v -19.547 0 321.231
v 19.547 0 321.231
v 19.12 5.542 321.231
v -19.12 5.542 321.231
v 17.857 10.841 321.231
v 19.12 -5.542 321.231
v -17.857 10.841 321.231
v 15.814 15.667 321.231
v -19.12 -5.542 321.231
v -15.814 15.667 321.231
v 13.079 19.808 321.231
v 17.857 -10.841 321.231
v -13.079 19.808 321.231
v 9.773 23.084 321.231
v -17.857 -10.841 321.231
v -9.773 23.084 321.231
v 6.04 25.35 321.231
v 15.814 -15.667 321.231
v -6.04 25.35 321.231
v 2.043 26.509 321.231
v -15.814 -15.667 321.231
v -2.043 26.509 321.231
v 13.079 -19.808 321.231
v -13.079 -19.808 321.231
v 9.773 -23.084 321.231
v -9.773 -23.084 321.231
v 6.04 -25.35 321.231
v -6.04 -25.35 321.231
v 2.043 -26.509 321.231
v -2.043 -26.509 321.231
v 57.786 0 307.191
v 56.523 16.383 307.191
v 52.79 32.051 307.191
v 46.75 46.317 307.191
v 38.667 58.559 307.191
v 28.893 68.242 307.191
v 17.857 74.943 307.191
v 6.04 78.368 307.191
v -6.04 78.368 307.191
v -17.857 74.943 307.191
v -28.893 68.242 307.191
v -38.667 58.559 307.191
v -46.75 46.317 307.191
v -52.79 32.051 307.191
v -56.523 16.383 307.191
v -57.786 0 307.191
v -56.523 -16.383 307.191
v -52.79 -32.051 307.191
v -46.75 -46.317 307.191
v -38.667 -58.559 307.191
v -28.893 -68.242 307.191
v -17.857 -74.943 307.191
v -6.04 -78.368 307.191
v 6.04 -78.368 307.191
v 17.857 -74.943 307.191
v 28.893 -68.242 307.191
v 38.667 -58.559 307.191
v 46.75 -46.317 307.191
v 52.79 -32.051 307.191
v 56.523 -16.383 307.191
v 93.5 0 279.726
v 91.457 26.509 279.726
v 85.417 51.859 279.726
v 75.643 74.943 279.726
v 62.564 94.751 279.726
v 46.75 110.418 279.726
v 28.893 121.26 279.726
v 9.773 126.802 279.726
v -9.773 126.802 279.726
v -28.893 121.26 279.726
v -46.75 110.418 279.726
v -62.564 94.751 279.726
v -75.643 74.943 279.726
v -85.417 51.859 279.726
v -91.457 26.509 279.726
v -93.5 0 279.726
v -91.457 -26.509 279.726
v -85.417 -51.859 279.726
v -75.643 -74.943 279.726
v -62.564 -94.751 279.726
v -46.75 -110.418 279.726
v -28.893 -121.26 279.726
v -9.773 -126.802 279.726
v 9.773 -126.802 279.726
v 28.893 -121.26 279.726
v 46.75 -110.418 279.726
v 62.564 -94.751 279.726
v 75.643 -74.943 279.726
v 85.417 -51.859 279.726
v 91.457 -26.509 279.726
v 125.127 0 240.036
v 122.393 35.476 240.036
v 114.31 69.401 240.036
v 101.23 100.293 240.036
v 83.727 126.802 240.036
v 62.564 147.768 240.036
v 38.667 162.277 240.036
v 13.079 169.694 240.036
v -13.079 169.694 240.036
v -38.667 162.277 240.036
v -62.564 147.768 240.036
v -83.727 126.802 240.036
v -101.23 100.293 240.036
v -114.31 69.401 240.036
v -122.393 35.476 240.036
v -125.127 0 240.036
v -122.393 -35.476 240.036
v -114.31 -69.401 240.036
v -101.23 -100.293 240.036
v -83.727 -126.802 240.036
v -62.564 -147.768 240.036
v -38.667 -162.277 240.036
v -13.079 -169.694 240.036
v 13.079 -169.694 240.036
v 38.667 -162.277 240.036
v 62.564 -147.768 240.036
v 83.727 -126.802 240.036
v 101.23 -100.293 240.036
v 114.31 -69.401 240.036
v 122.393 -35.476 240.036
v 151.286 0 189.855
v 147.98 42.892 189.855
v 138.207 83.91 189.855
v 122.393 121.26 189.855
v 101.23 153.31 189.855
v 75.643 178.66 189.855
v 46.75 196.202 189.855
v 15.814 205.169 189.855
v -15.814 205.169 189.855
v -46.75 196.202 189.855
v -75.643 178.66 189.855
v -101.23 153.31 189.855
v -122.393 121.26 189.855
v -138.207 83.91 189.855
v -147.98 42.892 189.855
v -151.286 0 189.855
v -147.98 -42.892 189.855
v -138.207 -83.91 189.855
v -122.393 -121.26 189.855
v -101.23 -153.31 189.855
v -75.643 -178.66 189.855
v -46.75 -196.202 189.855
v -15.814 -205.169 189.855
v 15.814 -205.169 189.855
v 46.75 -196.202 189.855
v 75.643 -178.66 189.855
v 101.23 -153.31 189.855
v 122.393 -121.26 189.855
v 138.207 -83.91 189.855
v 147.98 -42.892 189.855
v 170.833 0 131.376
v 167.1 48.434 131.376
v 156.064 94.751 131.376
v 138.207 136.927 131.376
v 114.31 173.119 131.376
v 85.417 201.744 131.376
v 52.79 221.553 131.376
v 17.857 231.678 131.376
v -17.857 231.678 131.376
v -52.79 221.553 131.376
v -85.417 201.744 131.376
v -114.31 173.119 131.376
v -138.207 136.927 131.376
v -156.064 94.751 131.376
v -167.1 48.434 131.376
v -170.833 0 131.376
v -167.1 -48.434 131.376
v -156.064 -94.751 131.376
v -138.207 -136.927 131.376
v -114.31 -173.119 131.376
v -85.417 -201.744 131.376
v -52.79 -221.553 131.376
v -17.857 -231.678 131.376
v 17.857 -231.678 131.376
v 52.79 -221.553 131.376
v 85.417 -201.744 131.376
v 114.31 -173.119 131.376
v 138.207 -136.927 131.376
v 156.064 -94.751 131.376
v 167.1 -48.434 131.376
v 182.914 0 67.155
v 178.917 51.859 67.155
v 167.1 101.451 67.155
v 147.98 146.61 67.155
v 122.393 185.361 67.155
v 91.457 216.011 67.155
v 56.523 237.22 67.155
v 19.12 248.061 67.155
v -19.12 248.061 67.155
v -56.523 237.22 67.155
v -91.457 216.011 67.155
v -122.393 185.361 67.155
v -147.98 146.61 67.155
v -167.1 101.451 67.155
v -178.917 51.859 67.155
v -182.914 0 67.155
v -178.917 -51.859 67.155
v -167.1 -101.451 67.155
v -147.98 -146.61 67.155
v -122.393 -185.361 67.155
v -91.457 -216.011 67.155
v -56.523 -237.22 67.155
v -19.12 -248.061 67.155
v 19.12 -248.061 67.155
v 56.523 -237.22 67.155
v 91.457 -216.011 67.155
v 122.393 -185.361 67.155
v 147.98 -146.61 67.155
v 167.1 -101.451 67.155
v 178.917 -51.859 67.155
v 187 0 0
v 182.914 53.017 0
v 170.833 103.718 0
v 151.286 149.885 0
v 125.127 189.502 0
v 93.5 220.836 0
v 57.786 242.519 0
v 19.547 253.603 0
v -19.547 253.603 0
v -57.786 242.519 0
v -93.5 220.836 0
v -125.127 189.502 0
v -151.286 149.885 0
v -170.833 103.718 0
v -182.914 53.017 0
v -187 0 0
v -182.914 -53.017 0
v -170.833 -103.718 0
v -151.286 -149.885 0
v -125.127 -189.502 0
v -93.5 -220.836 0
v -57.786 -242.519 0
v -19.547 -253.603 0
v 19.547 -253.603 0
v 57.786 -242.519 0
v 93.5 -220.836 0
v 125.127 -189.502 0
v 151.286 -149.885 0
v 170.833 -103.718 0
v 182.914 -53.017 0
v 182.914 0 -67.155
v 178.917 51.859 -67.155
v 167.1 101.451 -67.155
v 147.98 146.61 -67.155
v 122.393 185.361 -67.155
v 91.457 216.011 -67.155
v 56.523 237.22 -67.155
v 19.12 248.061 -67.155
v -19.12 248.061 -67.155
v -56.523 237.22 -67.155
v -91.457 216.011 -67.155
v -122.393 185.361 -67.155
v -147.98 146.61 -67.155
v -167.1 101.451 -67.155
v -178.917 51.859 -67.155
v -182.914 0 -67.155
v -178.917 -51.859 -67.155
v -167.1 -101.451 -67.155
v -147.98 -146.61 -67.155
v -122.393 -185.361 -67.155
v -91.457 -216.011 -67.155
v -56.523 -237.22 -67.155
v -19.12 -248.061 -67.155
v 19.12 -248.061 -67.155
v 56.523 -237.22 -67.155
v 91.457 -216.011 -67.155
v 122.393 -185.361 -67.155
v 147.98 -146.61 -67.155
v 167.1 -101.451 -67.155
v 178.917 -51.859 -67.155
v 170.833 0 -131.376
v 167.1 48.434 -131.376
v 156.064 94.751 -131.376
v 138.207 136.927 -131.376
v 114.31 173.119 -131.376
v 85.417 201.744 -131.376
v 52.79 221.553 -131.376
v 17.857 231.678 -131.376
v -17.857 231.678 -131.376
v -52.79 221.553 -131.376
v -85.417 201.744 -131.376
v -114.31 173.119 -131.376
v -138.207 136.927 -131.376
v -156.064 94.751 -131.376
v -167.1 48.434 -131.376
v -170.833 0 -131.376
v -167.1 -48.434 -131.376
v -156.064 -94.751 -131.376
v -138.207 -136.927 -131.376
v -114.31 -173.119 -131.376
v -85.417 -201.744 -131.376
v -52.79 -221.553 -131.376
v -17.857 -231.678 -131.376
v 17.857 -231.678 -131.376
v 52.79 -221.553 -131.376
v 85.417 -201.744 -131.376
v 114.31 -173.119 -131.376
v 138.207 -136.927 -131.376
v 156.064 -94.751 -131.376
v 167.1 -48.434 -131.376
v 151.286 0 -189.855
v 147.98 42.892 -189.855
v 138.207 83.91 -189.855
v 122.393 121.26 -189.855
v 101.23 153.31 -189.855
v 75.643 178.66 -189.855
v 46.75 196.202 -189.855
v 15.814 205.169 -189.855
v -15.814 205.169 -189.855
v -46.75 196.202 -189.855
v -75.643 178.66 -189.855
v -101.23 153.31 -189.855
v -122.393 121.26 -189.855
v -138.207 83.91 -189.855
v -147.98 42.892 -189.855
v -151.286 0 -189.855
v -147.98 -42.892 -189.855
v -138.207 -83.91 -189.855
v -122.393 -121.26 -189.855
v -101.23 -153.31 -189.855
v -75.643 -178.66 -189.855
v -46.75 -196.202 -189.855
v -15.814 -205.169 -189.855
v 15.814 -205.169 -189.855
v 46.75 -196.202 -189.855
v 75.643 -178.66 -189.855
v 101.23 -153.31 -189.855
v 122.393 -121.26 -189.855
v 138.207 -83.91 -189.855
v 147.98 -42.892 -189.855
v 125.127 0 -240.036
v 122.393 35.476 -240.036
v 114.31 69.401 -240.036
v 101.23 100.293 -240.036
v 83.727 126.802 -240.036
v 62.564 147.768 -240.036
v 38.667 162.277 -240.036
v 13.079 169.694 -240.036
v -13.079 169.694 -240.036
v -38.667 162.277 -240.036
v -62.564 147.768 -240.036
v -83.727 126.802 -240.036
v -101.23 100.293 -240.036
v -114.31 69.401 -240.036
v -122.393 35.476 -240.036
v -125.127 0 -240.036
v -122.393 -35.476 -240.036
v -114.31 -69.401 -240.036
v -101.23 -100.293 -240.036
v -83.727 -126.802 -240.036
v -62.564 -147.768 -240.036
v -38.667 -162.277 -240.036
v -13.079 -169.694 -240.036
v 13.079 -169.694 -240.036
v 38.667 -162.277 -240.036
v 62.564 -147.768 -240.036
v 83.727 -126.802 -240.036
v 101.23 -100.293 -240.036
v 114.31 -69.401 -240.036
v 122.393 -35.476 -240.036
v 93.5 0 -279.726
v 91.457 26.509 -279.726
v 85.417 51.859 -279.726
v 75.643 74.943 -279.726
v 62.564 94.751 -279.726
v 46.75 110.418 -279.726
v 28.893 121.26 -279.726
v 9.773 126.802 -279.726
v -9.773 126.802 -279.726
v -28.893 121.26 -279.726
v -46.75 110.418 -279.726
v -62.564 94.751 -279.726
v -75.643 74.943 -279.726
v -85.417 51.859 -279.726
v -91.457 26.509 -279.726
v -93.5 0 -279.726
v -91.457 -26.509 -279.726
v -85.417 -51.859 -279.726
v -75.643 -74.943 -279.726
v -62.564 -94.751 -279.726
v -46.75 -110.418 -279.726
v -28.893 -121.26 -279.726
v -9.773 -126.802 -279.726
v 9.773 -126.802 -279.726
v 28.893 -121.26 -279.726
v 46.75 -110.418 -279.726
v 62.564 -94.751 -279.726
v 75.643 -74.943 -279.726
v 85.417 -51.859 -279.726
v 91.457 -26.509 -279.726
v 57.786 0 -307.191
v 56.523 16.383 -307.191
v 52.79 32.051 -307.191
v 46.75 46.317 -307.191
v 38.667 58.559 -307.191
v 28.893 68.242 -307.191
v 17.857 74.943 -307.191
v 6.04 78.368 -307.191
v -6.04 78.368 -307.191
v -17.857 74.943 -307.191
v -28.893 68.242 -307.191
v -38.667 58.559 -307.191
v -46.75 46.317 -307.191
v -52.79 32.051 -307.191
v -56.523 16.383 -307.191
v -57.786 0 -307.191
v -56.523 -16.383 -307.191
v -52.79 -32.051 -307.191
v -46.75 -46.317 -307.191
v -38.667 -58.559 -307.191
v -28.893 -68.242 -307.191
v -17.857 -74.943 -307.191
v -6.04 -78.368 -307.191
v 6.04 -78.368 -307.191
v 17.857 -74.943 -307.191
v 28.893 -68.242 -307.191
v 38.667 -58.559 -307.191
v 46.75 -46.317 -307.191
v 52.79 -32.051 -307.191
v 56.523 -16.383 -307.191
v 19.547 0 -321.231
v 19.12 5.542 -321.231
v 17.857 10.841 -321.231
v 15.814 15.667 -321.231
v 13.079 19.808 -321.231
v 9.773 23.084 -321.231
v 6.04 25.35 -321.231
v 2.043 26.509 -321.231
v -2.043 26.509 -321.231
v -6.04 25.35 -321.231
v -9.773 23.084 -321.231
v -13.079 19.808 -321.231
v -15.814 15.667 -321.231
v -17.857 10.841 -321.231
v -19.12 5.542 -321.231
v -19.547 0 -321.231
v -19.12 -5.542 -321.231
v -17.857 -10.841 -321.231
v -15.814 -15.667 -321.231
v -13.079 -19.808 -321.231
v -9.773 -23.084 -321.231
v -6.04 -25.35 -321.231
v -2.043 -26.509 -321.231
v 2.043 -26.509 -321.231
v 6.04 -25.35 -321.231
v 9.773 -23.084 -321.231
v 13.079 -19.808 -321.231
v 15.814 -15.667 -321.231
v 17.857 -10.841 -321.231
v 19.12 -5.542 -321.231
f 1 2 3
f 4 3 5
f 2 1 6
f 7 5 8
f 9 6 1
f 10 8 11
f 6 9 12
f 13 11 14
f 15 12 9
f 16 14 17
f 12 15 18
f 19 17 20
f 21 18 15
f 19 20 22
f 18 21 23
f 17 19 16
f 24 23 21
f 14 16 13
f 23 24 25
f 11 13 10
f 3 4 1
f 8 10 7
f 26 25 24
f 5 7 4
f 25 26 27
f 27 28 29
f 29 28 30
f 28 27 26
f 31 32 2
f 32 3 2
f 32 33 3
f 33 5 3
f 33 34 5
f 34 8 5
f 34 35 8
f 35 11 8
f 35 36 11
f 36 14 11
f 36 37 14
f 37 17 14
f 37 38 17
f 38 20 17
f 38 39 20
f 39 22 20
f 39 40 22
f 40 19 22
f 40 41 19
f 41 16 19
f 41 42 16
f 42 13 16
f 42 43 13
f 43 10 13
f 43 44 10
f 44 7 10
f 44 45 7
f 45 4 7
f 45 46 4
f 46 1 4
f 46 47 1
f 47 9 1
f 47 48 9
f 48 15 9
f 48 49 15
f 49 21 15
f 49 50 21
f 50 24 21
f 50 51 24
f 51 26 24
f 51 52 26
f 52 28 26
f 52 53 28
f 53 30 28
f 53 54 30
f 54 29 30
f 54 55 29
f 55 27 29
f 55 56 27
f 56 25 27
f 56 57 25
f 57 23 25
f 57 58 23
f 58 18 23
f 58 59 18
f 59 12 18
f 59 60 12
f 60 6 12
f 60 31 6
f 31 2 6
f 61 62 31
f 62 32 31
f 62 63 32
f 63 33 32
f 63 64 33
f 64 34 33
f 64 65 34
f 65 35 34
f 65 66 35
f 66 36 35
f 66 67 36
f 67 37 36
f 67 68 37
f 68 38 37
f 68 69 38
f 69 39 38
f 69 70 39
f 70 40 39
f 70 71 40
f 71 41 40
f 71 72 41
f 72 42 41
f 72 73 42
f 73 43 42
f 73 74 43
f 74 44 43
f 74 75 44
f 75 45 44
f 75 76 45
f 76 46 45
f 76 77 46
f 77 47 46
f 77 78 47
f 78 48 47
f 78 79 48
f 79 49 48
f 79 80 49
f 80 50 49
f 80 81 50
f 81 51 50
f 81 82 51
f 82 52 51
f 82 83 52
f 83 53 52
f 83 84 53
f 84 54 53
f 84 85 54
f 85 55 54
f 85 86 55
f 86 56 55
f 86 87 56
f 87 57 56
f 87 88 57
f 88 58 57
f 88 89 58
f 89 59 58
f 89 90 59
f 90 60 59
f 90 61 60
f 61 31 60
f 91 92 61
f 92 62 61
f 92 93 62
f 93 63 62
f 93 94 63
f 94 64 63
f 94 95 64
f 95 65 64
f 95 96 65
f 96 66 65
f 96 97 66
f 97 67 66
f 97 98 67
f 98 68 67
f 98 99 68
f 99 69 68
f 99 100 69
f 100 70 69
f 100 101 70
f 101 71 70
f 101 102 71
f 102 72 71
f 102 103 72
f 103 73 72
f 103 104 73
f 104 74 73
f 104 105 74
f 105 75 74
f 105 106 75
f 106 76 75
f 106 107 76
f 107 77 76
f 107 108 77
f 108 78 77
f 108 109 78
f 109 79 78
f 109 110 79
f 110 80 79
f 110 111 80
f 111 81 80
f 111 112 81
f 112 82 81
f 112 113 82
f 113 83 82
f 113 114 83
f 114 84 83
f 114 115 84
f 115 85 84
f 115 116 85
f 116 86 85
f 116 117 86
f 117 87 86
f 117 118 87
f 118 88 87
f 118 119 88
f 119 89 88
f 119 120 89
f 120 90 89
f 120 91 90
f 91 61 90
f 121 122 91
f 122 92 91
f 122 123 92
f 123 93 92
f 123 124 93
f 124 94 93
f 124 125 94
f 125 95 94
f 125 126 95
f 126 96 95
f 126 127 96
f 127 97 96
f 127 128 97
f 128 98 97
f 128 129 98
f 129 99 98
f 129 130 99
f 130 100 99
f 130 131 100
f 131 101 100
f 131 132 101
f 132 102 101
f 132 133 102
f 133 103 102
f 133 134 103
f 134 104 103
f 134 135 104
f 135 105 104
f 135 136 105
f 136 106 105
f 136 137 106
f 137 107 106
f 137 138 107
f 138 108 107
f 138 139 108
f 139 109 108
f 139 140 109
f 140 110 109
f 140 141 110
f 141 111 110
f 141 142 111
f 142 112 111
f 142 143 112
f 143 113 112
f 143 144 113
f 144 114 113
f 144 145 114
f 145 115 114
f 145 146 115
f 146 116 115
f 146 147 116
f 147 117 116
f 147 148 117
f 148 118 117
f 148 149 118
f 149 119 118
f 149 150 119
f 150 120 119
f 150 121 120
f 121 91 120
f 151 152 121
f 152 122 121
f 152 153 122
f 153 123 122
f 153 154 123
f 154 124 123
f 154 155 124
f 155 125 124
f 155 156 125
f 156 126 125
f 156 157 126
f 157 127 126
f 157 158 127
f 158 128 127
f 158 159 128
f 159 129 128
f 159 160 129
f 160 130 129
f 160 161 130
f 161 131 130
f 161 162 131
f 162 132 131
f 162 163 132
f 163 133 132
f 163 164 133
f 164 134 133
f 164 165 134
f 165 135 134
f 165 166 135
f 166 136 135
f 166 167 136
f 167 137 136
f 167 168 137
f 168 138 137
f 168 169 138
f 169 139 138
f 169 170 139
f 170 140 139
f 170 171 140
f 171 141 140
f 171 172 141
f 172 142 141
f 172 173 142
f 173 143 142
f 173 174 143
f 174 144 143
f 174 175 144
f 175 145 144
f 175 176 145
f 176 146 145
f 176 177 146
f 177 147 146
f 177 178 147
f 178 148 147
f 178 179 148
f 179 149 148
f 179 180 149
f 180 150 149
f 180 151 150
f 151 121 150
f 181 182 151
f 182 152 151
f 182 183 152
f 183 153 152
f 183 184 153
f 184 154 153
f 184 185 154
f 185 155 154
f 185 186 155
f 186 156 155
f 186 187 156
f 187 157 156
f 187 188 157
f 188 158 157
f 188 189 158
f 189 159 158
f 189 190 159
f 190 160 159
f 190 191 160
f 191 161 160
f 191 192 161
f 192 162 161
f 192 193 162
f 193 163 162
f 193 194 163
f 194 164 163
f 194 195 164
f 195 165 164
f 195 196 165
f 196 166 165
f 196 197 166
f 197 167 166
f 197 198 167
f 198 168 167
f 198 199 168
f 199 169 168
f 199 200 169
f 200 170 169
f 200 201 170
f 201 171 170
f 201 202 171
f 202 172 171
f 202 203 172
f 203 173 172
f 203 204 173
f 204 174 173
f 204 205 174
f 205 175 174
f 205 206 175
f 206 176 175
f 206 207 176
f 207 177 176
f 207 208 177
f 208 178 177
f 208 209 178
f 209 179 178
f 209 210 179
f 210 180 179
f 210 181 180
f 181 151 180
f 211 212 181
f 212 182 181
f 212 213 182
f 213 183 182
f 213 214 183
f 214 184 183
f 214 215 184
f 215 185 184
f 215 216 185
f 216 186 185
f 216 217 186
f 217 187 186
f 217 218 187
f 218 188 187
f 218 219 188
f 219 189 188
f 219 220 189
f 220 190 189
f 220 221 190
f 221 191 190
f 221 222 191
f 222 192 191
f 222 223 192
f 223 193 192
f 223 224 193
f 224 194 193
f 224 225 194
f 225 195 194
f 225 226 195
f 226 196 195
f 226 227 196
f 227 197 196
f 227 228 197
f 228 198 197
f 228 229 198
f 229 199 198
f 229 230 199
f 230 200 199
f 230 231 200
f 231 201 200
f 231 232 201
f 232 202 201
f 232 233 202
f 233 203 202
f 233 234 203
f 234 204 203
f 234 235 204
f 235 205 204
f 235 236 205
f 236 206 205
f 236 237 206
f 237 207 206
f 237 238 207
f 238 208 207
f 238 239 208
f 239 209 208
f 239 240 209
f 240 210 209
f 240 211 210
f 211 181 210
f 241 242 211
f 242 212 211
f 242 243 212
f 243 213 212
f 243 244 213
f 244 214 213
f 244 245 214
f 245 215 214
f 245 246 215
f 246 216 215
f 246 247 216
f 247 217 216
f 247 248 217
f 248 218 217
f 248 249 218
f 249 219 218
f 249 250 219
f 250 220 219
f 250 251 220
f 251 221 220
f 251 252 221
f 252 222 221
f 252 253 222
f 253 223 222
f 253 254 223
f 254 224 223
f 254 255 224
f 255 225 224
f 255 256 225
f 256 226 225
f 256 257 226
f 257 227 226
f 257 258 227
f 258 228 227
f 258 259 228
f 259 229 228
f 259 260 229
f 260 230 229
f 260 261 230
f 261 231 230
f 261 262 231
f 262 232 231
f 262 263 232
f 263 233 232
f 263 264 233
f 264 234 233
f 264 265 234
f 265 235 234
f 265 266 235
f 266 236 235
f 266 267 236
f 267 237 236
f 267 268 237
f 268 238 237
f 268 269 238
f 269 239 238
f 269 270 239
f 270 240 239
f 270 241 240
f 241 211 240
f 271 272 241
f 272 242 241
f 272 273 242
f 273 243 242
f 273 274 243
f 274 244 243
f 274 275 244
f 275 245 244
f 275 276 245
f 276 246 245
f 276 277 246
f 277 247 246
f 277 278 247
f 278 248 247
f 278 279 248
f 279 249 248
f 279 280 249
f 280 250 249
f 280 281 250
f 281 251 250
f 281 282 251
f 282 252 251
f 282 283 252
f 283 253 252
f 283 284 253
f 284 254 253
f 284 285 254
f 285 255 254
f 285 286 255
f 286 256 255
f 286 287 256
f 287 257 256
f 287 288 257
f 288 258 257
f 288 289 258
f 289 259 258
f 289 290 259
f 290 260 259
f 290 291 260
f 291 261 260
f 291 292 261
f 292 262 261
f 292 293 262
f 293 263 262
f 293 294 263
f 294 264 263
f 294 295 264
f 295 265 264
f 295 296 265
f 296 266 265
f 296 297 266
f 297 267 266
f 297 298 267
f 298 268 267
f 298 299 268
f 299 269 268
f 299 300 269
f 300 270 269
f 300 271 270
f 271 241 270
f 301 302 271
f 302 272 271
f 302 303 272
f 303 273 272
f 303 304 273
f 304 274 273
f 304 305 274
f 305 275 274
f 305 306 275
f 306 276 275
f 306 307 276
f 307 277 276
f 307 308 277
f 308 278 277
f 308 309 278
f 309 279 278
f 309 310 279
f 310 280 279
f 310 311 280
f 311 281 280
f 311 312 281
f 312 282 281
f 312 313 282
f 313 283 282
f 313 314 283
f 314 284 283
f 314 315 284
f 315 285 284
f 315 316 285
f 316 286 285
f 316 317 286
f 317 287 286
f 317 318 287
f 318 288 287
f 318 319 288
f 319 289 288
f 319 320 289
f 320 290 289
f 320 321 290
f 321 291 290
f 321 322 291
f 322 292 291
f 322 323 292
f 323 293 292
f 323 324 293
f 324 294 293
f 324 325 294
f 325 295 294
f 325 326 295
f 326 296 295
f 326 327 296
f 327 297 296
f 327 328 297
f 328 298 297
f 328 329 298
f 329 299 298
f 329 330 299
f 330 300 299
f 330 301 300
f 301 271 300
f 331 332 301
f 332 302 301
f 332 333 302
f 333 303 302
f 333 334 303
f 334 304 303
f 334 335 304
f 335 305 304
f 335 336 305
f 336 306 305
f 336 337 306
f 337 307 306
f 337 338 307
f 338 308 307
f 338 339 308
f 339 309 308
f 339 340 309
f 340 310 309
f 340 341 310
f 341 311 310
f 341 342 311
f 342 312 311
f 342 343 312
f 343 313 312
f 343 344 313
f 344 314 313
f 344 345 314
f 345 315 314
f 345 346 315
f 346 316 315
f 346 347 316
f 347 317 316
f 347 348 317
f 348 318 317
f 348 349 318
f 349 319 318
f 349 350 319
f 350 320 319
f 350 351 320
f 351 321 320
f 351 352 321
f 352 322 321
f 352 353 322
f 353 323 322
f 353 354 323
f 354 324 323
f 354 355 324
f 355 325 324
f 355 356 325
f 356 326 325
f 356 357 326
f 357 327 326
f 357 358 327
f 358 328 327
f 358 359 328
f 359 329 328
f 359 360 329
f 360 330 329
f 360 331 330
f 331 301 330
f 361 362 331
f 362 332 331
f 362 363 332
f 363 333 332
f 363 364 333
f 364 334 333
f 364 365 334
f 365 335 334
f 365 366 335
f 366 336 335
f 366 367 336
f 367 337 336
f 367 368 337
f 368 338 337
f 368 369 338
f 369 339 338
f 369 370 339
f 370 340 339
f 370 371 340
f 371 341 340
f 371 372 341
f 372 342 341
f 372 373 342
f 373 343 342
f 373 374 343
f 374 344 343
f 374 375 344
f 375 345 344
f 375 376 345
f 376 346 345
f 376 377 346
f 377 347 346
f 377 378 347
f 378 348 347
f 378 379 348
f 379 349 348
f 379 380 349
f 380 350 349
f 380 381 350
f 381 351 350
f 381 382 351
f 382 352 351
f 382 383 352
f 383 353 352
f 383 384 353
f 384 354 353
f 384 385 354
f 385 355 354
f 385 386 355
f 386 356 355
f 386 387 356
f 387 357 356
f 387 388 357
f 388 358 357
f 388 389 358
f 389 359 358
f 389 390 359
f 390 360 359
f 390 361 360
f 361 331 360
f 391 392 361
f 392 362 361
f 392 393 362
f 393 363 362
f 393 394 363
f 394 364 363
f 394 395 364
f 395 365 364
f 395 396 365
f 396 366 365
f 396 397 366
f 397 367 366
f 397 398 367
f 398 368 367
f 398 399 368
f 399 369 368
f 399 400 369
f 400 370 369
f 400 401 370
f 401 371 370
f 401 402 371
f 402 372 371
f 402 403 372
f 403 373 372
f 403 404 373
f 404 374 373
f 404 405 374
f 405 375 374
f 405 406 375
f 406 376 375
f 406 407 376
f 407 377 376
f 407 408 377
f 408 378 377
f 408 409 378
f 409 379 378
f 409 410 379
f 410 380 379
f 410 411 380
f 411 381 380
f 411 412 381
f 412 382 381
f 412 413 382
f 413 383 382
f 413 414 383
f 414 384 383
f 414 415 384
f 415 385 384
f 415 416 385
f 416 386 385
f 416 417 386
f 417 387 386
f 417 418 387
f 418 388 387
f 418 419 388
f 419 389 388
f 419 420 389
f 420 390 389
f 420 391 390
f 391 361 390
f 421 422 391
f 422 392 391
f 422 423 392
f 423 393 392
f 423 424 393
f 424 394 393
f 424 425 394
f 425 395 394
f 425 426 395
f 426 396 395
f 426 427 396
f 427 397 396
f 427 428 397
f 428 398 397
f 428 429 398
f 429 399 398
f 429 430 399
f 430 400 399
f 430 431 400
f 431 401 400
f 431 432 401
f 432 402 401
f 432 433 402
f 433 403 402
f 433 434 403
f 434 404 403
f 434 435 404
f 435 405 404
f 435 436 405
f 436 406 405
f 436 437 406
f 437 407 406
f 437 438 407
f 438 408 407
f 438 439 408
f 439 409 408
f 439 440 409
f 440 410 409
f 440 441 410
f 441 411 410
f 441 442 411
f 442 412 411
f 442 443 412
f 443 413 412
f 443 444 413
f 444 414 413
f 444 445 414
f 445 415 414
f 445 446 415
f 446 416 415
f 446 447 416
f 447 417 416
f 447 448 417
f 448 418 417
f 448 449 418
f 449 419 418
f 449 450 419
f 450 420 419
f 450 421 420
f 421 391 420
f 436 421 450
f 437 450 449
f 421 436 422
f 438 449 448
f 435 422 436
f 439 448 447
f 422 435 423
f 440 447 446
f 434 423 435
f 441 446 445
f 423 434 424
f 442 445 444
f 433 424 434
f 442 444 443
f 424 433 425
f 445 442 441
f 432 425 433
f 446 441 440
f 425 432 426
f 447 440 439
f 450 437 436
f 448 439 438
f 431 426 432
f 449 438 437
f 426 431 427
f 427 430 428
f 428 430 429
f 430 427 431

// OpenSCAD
// Generated by SolidPython 1.0.1 on 2020-07-29 00:46:50


scale(v = [11, 15, 19]) {
	sphere(r = 17);
}
/***********************************************
*********      SolidPython code:      **********
************************************************
 
# import packages: SolidPython
from solid import *
from solid.utils import *
from itertools import chain, combinations, permutations


class Resize:

    def __init__(self, scad_file):
        self.scad_file = scad_file
        #self.scad_file = import_scad(scad_file)
        # cone/cylinder param:
        self.r1 = 0
        self.r2 = 0
        self.h = 0
        # rectangular prism param:
        self.w = 0
        self.l = 0
        # ellipse param:
        self.r = 0

    # import OpenScad code (file name corresponds to shape)


    # classify shape + parameters
    def assign(self, param1, param2, param3):
        if self.scad_file == 'cone.scad':
            self.r1 = param1
            self.r2 = param2
            self.h = param3
        elif self.scad_file == 'cylinder.scad':
            self.r1 = param1
            self.r2 = param2
            self.h = param3
        elif self.scad_file == 'rectangularPrism.scad':
            self.h = param1
            self.l = param2
            self.w = param3
        else:
            self.r = param1
            self.h = param2

    # resize parameters
    def iterate(self):
        x = range(3, 20, 2)
        i = 1
        if self.scad_file == 'cone.scad':
            tempList = list(permutations(x, 2))
            for temp in tempList:
                param1 = temp[0]
                param2 = temp[1]
                filepath = 'produced_scad_files/' + 'cone' + str(param1) + '_' + str(param2) + '_' + '.scad'
                scad_render_to_file(cylinder(h=param1, r1=param2, r2=0), filepath)

        elif self.scad_file == 'cylinder.scad':
            tempList = list(permutations(x, 3))
            for temp in tempList:
                param1 = temp[0]
                param2 = temp[1]
                filepath = 'produced_scad_files/' + 'cylinder' + str(param1) + '_' + str(param2) + '_' + '.scad'
                scad_render_to_file(cylinder(h=param1, r1=param2, r2=param2), filepath)

        elif self.scad_file == 'rectangularPrism.scad':
            tempList = list(permutations(x, 3))
            for temp in tempList:
                param1 = temp[0]
                param2 = temp[1]
                param3 = temp[2]
                filepath = 'produced_scad_files/' + 'rectangularPrism' + str(param1) + '_' + str(param2) + '_' + str(
                    param3) + '.scad'
                scad_render_to_file(cube(size=(param1, param2, param3)), filepath)

        elif self.scad_file == 'ellipse.scad':
            tempList = list(permutations(x, 4))
            for temp in tempList:
                param1 = temp[0]
                param2 = temp[1]
                param3 = temp[2]
                param4 = temp[3]
                filepath = 'produced_scad_files/' + 'ellipse' + str(param1) + '_' + str(param2) + '_' + str(param3) + '_' + str(param4) + '.scad'
                scad_render_to_file(scale([param1, param2, param3])(sphere(r=param4)), filepath)

    def render_to_scadfile(self):
        scad_render_to_file(scad, 'example.scad') 
 
************************************************/
